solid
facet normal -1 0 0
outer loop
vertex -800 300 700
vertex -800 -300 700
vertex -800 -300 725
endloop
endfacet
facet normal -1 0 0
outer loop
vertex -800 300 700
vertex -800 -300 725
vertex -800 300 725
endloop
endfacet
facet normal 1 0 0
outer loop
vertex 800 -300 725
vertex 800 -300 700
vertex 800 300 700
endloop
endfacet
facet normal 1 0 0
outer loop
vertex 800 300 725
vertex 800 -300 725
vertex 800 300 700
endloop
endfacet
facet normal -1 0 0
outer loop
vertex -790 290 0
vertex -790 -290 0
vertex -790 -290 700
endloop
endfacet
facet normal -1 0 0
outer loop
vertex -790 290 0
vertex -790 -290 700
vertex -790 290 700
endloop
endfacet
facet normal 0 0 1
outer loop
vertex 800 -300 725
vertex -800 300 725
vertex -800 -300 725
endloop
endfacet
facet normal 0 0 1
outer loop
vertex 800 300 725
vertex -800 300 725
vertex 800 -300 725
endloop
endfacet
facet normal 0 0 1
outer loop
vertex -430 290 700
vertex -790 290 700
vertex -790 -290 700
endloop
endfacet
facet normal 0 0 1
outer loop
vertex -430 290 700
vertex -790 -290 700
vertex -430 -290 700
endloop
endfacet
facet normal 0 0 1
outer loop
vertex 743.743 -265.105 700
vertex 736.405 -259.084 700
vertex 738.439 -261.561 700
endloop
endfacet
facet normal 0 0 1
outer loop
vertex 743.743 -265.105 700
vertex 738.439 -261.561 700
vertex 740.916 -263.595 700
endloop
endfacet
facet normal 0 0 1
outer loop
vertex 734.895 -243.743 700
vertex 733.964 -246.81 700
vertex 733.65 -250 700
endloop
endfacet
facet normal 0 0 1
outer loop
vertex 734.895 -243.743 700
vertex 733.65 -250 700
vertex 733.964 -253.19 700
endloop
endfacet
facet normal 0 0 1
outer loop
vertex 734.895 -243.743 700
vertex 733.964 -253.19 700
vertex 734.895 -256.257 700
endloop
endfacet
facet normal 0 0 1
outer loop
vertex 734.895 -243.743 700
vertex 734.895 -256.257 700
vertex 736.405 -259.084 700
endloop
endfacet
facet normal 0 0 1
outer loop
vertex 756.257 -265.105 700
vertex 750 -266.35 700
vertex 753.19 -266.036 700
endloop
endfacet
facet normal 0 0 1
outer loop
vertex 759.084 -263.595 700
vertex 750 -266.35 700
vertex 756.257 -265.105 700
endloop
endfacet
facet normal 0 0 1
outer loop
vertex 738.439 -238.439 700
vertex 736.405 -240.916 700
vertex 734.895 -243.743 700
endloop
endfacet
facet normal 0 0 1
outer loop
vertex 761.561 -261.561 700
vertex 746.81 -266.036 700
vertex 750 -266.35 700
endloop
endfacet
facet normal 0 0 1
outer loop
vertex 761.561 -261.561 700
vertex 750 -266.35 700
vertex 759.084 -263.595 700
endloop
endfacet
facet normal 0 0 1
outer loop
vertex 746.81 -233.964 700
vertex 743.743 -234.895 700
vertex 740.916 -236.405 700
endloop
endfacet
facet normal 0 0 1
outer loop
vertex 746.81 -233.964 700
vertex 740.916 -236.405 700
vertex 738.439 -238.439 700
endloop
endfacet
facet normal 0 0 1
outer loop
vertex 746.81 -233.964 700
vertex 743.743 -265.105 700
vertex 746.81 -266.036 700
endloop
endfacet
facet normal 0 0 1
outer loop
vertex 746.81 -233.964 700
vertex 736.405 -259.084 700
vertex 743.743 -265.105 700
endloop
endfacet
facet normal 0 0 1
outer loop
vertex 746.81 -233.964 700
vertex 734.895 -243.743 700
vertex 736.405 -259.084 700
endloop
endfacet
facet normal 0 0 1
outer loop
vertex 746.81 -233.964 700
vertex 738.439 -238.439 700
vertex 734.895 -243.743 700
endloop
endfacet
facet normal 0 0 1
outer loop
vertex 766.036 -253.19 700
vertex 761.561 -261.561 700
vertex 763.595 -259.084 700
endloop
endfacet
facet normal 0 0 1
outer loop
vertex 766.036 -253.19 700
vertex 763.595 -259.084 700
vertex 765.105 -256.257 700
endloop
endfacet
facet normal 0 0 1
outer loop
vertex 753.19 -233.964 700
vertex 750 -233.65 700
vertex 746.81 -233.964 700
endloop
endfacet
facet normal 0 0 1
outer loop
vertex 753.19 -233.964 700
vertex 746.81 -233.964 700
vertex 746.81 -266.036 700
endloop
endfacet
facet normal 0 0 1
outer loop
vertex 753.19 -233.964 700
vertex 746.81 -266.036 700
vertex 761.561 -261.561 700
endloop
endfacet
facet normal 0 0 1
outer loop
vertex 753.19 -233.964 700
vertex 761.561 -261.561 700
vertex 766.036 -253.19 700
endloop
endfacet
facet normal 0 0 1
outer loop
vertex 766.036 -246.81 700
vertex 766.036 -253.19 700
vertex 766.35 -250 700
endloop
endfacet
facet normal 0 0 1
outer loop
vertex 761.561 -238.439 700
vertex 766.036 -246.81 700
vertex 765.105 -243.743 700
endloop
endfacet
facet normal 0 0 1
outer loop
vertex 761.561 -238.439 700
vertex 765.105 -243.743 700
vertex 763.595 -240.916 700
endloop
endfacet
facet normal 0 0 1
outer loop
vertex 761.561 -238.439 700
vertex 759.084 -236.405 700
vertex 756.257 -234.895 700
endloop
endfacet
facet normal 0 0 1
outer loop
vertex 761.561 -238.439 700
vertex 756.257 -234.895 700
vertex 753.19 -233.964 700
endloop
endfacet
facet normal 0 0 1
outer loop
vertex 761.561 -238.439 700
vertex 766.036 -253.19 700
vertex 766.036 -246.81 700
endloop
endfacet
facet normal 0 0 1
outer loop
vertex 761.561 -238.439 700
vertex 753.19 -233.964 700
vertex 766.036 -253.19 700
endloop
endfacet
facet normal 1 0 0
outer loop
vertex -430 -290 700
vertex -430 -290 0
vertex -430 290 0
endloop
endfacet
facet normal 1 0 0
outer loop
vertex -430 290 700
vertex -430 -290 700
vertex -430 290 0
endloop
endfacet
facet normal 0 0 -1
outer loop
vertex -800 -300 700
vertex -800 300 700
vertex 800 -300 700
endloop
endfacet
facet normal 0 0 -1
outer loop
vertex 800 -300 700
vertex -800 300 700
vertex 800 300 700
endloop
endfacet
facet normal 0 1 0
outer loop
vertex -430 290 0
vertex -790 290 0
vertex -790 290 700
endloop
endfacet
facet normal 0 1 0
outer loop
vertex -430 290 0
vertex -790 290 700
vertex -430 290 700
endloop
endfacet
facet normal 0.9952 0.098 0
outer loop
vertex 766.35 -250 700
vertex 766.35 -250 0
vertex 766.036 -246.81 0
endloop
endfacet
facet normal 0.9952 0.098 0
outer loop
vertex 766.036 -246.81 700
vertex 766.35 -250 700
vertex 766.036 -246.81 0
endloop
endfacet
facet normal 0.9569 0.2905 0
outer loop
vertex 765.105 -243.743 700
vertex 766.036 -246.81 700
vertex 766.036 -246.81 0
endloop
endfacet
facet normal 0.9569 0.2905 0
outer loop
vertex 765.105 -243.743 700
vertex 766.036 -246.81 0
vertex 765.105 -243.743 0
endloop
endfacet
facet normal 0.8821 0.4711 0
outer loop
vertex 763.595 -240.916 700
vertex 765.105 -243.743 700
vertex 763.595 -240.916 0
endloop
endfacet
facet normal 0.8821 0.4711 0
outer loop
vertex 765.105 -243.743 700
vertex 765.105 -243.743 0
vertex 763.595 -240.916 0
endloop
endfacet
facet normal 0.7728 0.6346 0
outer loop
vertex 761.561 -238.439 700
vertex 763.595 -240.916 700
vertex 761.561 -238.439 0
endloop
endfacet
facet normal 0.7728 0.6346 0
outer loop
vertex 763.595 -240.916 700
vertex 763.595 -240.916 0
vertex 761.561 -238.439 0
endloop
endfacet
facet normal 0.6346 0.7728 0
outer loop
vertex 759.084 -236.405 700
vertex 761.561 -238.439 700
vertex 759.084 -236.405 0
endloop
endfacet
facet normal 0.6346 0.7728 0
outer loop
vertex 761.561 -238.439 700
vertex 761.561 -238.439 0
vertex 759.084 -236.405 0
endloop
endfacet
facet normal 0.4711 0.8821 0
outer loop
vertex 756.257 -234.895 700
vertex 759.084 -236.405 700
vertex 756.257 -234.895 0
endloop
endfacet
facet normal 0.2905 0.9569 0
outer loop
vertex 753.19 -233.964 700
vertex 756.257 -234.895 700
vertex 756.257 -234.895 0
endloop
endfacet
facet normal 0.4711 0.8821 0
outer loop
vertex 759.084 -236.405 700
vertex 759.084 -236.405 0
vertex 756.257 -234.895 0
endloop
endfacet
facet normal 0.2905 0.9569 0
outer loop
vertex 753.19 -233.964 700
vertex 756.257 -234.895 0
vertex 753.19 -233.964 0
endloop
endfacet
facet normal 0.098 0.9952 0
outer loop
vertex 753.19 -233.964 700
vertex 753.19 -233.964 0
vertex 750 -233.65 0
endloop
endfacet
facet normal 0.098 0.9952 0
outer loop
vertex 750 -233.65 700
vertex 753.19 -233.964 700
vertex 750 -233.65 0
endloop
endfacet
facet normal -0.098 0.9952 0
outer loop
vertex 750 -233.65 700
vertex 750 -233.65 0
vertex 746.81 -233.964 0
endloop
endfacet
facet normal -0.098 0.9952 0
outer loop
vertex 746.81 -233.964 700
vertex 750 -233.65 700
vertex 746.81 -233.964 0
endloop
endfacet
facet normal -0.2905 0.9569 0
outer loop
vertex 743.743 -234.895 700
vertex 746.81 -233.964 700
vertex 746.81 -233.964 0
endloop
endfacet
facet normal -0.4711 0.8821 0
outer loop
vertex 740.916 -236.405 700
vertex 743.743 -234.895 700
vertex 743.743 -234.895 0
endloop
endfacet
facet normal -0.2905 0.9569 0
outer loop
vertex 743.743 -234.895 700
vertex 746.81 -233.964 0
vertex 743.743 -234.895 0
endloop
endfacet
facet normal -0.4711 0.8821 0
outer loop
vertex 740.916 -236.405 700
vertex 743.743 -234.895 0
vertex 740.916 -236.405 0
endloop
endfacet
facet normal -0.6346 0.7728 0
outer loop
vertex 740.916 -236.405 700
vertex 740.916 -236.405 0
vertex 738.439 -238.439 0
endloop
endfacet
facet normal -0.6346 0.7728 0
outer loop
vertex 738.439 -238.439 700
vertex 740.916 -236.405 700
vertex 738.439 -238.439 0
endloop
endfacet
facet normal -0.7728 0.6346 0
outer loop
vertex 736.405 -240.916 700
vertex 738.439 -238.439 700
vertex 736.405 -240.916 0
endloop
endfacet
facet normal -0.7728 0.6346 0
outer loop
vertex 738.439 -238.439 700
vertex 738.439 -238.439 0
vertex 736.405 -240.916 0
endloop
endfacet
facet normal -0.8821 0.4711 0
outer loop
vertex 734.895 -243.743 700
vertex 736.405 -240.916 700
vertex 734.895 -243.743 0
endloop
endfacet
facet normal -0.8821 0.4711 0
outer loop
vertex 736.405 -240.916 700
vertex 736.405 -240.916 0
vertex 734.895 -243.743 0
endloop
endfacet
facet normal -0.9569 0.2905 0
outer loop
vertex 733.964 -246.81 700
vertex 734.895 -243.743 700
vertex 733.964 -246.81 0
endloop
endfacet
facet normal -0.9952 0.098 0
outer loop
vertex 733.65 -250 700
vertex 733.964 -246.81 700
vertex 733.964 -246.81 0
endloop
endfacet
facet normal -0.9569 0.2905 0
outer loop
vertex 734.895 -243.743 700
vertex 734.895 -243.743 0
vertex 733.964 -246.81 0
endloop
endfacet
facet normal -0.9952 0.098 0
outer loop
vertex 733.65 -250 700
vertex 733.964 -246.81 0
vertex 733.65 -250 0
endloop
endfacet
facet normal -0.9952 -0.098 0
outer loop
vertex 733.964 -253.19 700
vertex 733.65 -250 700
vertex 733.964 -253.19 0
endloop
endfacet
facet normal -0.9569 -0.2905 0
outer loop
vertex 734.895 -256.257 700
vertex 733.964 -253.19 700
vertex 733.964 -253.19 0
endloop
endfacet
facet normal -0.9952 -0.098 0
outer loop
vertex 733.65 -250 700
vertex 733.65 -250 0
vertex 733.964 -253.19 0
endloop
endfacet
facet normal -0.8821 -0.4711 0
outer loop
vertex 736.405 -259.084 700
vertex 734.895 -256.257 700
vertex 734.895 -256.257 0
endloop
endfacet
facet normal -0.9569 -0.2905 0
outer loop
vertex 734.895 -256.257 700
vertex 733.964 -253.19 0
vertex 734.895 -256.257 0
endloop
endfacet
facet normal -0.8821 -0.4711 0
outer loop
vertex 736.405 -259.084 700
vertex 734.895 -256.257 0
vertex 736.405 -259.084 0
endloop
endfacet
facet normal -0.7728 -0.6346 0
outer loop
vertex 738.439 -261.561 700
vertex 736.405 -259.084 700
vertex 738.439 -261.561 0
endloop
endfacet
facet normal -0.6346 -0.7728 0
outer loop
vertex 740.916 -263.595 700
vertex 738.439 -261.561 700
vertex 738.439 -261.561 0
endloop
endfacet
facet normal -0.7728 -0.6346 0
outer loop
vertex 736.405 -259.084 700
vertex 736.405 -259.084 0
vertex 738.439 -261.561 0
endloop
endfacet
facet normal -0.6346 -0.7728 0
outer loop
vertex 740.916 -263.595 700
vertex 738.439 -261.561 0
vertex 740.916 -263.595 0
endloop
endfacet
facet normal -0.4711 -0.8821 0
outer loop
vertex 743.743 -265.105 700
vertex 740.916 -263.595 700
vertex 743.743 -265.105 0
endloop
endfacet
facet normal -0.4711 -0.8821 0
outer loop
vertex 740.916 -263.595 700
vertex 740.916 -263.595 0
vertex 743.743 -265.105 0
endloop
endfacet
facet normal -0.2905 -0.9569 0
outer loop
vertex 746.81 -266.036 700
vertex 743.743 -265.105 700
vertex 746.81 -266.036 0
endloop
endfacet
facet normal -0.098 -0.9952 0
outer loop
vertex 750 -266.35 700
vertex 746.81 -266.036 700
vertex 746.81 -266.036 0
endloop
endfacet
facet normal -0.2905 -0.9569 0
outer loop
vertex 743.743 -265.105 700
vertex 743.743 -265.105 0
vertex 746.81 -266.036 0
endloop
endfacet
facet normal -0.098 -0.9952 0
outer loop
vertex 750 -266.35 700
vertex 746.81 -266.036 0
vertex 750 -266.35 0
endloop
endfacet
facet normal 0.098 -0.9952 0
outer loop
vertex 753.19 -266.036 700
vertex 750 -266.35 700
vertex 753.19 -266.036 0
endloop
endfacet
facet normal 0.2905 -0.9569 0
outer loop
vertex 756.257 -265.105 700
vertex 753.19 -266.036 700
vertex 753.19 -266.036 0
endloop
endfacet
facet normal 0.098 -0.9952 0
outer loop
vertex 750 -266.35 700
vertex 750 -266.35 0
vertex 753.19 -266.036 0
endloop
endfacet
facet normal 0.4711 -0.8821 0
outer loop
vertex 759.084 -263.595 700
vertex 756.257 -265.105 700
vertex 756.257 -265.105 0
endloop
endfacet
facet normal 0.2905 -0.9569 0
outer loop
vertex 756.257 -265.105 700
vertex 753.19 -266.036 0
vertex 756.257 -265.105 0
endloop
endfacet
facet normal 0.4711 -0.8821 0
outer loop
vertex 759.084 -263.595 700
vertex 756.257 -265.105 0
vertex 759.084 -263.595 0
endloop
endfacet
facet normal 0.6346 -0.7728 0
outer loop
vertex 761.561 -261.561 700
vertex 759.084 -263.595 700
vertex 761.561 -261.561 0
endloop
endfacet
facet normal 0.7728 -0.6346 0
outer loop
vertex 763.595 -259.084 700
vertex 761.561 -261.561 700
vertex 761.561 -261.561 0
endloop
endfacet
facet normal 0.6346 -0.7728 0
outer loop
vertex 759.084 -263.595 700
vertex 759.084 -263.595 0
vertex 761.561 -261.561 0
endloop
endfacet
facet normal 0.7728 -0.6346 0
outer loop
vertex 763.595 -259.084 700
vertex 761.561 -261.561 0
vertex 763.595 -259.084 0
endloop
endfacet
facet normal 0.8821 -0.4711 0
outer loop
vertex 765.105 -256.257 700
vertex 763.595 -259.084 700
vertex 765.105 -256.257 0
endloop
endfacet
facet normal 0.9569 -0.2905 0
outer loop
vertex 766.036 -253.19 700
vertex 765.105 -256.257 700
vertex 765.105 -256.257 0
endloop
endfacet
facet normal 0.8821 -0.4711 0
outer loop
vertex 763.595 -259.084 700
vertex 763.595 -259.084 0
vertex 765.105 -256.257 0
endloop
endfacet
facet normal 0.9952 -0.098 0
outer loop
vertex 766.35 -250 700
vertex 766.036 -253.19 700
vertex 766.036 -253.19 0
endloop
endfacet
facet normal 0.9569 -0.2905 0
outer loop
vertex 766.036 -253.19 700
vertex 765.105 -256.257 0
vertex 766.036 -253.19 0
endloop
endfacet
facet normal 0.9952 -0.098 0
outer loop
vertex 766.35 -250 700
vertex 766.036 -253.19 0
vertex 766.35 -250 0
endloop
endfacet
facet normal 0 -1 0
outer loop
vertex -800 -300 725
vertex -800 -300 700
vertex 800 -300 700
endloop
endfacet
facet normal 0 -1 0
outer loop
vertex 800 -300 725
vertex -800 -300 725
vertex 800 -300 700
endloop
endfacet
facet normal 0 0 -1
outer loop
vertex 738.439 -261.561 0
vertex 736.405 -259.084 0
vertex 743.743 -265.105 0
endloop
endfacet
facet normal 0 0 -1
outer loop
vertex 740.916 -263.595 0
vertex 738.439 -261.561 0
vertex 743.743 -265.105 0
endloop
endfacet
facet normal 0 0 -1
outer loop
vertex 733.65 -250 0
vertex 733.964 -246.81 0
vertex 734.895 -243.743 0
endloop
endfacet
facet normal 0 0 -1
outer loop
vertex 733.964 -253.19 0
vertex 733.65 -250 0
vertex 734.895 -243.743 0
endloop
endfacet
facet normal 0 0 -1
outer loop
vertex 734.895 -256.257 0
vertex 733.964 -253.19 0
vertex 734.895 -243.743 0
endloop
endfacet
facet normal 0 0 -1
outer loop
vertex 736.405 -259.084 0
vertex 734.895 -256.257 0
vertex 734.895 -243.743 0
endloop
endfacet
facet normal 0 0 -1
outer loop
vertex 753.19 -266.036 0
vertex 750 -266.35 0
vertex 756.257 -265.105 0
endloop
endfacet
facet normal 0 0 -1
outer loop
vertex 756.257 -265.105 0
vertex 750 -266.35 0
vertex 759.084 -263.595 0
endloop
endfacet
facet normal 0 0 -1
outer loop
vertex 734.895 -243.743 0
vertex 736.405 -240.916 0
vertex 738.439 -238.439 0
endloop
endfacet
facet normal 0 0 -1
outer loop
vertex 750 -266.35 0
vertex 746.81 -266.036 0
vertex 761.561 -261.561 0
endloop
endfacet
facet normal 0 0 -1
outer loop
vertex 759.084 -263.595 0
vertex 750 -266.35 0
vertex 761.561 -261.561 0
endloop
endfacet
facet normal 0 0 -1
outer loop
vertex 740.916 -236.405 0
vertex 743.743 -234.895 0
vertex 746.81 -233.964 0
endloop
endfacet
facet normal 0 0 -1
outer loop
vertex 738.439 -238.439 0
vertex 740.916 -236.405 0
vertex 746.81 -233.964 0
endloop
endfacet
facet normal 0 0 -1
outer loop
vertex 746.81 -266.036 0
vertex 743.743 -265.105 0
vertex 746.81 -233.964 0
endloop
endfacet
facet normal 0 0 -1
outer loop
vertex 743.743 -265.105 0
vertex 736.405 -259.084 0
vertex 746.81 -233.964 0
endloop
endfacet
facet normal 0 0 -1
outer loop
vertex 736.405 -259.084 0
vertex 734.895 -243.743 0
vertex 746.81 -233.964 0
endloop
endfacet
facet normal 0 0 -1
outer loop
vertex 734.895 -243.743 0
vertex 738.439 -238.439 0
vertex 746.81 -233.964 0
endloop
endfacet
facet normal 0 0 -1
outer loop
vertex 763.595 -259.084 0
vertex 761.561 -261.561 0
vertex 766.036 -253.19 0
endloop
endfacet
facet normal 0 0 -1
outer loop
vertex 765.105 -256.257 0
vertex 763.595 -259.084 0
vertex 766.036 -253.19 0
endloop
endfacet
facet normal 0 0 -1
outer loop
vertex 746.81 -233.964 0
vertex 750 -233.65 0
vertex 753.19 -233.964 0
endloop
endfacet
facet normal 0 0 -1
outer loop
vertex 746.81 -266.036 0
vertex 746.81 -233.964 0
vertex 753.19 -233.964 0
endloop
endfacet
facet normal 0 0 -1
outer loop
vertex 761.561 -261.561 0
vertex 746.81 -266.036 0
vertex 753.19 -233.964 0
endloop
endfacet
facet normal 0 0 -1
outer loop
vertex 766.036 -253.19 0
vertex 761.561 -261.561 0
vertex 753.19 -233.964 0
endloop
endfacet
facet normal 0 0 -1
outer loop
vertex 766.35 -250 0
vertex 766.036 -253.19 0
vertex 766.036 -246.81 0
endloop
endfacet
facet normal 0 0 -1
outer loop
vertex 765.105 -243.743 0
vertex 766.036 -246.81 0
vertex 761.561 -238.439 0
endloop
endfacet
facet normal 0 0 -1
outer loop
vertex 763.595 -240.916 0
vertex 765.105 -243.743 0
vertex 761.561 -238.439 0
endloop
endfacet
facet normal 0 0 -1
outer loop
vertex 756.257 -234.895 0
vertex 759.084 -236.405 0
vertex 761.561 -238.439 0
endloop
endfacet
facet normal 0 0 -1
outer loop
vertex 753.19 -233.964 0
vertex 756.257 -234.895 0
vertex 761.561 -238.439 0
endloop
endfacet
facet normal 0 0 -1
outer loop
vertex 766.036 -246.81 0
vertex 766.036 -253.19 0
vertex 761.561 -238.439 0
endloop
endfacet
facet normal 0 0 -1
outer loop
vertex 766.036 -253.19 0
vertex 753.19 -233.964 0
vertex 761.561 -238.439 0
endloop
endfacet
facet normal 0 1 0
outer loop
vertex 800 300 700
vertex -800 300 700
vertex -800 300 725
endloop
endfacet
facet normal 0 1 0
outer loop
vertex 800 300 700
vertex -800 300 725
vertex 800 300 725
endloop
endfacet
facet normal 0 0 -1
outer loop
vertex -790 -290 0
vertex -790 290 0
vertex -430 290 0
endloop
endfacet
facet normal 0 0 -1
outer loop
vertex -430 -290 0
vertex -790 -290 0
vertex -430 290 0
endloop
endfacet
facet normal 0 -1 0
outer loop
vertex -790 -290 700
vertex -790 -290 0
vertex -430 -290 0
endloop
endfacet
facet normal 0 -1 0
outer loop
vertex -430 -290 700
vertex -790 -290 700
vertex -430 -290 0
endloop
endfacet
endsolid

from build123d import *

# Parameters (mm, degrees)
F1_START = 700
F0_W     = 1600
F0_H     = 600
F1_DEPTH = 25
F2_W     = 360
F2_H     = 580
F3_DEPTH = 700
F4_R     = 16.35
F5_DEPTH = 700


# Not quite as in the source:
# - a feature names something its author has since deleted; it is built from what else it names


with BuildPart() as f1:
    # F0 (on Top) → F1 (new body)
    with BuildSketch(Plane.XY.offset(F1_START)):
        Rectangle(F0_W, F0_H)
    extrude(amount=F1_DEPTH)


with BuildPart() as f3:
    # F2 (on Top) → F3 (new body)
    with BuildSketch(Plane.XY):
        with Locations((-610, 0)):
            Rectangle(F2_W, F2_H)
    extrude(amount=F3_DEPTH)


with BuildPart() as f5:
    # F4 (on Top) → F5 (new body)
    with BuildSketch(Plane.XY):
        with Locations((750, -250)):
            Circle(F4_R)
    extrude(amount=F5_DEPTH)


solid = Compound([f1.part, f3.part, f5.part])
